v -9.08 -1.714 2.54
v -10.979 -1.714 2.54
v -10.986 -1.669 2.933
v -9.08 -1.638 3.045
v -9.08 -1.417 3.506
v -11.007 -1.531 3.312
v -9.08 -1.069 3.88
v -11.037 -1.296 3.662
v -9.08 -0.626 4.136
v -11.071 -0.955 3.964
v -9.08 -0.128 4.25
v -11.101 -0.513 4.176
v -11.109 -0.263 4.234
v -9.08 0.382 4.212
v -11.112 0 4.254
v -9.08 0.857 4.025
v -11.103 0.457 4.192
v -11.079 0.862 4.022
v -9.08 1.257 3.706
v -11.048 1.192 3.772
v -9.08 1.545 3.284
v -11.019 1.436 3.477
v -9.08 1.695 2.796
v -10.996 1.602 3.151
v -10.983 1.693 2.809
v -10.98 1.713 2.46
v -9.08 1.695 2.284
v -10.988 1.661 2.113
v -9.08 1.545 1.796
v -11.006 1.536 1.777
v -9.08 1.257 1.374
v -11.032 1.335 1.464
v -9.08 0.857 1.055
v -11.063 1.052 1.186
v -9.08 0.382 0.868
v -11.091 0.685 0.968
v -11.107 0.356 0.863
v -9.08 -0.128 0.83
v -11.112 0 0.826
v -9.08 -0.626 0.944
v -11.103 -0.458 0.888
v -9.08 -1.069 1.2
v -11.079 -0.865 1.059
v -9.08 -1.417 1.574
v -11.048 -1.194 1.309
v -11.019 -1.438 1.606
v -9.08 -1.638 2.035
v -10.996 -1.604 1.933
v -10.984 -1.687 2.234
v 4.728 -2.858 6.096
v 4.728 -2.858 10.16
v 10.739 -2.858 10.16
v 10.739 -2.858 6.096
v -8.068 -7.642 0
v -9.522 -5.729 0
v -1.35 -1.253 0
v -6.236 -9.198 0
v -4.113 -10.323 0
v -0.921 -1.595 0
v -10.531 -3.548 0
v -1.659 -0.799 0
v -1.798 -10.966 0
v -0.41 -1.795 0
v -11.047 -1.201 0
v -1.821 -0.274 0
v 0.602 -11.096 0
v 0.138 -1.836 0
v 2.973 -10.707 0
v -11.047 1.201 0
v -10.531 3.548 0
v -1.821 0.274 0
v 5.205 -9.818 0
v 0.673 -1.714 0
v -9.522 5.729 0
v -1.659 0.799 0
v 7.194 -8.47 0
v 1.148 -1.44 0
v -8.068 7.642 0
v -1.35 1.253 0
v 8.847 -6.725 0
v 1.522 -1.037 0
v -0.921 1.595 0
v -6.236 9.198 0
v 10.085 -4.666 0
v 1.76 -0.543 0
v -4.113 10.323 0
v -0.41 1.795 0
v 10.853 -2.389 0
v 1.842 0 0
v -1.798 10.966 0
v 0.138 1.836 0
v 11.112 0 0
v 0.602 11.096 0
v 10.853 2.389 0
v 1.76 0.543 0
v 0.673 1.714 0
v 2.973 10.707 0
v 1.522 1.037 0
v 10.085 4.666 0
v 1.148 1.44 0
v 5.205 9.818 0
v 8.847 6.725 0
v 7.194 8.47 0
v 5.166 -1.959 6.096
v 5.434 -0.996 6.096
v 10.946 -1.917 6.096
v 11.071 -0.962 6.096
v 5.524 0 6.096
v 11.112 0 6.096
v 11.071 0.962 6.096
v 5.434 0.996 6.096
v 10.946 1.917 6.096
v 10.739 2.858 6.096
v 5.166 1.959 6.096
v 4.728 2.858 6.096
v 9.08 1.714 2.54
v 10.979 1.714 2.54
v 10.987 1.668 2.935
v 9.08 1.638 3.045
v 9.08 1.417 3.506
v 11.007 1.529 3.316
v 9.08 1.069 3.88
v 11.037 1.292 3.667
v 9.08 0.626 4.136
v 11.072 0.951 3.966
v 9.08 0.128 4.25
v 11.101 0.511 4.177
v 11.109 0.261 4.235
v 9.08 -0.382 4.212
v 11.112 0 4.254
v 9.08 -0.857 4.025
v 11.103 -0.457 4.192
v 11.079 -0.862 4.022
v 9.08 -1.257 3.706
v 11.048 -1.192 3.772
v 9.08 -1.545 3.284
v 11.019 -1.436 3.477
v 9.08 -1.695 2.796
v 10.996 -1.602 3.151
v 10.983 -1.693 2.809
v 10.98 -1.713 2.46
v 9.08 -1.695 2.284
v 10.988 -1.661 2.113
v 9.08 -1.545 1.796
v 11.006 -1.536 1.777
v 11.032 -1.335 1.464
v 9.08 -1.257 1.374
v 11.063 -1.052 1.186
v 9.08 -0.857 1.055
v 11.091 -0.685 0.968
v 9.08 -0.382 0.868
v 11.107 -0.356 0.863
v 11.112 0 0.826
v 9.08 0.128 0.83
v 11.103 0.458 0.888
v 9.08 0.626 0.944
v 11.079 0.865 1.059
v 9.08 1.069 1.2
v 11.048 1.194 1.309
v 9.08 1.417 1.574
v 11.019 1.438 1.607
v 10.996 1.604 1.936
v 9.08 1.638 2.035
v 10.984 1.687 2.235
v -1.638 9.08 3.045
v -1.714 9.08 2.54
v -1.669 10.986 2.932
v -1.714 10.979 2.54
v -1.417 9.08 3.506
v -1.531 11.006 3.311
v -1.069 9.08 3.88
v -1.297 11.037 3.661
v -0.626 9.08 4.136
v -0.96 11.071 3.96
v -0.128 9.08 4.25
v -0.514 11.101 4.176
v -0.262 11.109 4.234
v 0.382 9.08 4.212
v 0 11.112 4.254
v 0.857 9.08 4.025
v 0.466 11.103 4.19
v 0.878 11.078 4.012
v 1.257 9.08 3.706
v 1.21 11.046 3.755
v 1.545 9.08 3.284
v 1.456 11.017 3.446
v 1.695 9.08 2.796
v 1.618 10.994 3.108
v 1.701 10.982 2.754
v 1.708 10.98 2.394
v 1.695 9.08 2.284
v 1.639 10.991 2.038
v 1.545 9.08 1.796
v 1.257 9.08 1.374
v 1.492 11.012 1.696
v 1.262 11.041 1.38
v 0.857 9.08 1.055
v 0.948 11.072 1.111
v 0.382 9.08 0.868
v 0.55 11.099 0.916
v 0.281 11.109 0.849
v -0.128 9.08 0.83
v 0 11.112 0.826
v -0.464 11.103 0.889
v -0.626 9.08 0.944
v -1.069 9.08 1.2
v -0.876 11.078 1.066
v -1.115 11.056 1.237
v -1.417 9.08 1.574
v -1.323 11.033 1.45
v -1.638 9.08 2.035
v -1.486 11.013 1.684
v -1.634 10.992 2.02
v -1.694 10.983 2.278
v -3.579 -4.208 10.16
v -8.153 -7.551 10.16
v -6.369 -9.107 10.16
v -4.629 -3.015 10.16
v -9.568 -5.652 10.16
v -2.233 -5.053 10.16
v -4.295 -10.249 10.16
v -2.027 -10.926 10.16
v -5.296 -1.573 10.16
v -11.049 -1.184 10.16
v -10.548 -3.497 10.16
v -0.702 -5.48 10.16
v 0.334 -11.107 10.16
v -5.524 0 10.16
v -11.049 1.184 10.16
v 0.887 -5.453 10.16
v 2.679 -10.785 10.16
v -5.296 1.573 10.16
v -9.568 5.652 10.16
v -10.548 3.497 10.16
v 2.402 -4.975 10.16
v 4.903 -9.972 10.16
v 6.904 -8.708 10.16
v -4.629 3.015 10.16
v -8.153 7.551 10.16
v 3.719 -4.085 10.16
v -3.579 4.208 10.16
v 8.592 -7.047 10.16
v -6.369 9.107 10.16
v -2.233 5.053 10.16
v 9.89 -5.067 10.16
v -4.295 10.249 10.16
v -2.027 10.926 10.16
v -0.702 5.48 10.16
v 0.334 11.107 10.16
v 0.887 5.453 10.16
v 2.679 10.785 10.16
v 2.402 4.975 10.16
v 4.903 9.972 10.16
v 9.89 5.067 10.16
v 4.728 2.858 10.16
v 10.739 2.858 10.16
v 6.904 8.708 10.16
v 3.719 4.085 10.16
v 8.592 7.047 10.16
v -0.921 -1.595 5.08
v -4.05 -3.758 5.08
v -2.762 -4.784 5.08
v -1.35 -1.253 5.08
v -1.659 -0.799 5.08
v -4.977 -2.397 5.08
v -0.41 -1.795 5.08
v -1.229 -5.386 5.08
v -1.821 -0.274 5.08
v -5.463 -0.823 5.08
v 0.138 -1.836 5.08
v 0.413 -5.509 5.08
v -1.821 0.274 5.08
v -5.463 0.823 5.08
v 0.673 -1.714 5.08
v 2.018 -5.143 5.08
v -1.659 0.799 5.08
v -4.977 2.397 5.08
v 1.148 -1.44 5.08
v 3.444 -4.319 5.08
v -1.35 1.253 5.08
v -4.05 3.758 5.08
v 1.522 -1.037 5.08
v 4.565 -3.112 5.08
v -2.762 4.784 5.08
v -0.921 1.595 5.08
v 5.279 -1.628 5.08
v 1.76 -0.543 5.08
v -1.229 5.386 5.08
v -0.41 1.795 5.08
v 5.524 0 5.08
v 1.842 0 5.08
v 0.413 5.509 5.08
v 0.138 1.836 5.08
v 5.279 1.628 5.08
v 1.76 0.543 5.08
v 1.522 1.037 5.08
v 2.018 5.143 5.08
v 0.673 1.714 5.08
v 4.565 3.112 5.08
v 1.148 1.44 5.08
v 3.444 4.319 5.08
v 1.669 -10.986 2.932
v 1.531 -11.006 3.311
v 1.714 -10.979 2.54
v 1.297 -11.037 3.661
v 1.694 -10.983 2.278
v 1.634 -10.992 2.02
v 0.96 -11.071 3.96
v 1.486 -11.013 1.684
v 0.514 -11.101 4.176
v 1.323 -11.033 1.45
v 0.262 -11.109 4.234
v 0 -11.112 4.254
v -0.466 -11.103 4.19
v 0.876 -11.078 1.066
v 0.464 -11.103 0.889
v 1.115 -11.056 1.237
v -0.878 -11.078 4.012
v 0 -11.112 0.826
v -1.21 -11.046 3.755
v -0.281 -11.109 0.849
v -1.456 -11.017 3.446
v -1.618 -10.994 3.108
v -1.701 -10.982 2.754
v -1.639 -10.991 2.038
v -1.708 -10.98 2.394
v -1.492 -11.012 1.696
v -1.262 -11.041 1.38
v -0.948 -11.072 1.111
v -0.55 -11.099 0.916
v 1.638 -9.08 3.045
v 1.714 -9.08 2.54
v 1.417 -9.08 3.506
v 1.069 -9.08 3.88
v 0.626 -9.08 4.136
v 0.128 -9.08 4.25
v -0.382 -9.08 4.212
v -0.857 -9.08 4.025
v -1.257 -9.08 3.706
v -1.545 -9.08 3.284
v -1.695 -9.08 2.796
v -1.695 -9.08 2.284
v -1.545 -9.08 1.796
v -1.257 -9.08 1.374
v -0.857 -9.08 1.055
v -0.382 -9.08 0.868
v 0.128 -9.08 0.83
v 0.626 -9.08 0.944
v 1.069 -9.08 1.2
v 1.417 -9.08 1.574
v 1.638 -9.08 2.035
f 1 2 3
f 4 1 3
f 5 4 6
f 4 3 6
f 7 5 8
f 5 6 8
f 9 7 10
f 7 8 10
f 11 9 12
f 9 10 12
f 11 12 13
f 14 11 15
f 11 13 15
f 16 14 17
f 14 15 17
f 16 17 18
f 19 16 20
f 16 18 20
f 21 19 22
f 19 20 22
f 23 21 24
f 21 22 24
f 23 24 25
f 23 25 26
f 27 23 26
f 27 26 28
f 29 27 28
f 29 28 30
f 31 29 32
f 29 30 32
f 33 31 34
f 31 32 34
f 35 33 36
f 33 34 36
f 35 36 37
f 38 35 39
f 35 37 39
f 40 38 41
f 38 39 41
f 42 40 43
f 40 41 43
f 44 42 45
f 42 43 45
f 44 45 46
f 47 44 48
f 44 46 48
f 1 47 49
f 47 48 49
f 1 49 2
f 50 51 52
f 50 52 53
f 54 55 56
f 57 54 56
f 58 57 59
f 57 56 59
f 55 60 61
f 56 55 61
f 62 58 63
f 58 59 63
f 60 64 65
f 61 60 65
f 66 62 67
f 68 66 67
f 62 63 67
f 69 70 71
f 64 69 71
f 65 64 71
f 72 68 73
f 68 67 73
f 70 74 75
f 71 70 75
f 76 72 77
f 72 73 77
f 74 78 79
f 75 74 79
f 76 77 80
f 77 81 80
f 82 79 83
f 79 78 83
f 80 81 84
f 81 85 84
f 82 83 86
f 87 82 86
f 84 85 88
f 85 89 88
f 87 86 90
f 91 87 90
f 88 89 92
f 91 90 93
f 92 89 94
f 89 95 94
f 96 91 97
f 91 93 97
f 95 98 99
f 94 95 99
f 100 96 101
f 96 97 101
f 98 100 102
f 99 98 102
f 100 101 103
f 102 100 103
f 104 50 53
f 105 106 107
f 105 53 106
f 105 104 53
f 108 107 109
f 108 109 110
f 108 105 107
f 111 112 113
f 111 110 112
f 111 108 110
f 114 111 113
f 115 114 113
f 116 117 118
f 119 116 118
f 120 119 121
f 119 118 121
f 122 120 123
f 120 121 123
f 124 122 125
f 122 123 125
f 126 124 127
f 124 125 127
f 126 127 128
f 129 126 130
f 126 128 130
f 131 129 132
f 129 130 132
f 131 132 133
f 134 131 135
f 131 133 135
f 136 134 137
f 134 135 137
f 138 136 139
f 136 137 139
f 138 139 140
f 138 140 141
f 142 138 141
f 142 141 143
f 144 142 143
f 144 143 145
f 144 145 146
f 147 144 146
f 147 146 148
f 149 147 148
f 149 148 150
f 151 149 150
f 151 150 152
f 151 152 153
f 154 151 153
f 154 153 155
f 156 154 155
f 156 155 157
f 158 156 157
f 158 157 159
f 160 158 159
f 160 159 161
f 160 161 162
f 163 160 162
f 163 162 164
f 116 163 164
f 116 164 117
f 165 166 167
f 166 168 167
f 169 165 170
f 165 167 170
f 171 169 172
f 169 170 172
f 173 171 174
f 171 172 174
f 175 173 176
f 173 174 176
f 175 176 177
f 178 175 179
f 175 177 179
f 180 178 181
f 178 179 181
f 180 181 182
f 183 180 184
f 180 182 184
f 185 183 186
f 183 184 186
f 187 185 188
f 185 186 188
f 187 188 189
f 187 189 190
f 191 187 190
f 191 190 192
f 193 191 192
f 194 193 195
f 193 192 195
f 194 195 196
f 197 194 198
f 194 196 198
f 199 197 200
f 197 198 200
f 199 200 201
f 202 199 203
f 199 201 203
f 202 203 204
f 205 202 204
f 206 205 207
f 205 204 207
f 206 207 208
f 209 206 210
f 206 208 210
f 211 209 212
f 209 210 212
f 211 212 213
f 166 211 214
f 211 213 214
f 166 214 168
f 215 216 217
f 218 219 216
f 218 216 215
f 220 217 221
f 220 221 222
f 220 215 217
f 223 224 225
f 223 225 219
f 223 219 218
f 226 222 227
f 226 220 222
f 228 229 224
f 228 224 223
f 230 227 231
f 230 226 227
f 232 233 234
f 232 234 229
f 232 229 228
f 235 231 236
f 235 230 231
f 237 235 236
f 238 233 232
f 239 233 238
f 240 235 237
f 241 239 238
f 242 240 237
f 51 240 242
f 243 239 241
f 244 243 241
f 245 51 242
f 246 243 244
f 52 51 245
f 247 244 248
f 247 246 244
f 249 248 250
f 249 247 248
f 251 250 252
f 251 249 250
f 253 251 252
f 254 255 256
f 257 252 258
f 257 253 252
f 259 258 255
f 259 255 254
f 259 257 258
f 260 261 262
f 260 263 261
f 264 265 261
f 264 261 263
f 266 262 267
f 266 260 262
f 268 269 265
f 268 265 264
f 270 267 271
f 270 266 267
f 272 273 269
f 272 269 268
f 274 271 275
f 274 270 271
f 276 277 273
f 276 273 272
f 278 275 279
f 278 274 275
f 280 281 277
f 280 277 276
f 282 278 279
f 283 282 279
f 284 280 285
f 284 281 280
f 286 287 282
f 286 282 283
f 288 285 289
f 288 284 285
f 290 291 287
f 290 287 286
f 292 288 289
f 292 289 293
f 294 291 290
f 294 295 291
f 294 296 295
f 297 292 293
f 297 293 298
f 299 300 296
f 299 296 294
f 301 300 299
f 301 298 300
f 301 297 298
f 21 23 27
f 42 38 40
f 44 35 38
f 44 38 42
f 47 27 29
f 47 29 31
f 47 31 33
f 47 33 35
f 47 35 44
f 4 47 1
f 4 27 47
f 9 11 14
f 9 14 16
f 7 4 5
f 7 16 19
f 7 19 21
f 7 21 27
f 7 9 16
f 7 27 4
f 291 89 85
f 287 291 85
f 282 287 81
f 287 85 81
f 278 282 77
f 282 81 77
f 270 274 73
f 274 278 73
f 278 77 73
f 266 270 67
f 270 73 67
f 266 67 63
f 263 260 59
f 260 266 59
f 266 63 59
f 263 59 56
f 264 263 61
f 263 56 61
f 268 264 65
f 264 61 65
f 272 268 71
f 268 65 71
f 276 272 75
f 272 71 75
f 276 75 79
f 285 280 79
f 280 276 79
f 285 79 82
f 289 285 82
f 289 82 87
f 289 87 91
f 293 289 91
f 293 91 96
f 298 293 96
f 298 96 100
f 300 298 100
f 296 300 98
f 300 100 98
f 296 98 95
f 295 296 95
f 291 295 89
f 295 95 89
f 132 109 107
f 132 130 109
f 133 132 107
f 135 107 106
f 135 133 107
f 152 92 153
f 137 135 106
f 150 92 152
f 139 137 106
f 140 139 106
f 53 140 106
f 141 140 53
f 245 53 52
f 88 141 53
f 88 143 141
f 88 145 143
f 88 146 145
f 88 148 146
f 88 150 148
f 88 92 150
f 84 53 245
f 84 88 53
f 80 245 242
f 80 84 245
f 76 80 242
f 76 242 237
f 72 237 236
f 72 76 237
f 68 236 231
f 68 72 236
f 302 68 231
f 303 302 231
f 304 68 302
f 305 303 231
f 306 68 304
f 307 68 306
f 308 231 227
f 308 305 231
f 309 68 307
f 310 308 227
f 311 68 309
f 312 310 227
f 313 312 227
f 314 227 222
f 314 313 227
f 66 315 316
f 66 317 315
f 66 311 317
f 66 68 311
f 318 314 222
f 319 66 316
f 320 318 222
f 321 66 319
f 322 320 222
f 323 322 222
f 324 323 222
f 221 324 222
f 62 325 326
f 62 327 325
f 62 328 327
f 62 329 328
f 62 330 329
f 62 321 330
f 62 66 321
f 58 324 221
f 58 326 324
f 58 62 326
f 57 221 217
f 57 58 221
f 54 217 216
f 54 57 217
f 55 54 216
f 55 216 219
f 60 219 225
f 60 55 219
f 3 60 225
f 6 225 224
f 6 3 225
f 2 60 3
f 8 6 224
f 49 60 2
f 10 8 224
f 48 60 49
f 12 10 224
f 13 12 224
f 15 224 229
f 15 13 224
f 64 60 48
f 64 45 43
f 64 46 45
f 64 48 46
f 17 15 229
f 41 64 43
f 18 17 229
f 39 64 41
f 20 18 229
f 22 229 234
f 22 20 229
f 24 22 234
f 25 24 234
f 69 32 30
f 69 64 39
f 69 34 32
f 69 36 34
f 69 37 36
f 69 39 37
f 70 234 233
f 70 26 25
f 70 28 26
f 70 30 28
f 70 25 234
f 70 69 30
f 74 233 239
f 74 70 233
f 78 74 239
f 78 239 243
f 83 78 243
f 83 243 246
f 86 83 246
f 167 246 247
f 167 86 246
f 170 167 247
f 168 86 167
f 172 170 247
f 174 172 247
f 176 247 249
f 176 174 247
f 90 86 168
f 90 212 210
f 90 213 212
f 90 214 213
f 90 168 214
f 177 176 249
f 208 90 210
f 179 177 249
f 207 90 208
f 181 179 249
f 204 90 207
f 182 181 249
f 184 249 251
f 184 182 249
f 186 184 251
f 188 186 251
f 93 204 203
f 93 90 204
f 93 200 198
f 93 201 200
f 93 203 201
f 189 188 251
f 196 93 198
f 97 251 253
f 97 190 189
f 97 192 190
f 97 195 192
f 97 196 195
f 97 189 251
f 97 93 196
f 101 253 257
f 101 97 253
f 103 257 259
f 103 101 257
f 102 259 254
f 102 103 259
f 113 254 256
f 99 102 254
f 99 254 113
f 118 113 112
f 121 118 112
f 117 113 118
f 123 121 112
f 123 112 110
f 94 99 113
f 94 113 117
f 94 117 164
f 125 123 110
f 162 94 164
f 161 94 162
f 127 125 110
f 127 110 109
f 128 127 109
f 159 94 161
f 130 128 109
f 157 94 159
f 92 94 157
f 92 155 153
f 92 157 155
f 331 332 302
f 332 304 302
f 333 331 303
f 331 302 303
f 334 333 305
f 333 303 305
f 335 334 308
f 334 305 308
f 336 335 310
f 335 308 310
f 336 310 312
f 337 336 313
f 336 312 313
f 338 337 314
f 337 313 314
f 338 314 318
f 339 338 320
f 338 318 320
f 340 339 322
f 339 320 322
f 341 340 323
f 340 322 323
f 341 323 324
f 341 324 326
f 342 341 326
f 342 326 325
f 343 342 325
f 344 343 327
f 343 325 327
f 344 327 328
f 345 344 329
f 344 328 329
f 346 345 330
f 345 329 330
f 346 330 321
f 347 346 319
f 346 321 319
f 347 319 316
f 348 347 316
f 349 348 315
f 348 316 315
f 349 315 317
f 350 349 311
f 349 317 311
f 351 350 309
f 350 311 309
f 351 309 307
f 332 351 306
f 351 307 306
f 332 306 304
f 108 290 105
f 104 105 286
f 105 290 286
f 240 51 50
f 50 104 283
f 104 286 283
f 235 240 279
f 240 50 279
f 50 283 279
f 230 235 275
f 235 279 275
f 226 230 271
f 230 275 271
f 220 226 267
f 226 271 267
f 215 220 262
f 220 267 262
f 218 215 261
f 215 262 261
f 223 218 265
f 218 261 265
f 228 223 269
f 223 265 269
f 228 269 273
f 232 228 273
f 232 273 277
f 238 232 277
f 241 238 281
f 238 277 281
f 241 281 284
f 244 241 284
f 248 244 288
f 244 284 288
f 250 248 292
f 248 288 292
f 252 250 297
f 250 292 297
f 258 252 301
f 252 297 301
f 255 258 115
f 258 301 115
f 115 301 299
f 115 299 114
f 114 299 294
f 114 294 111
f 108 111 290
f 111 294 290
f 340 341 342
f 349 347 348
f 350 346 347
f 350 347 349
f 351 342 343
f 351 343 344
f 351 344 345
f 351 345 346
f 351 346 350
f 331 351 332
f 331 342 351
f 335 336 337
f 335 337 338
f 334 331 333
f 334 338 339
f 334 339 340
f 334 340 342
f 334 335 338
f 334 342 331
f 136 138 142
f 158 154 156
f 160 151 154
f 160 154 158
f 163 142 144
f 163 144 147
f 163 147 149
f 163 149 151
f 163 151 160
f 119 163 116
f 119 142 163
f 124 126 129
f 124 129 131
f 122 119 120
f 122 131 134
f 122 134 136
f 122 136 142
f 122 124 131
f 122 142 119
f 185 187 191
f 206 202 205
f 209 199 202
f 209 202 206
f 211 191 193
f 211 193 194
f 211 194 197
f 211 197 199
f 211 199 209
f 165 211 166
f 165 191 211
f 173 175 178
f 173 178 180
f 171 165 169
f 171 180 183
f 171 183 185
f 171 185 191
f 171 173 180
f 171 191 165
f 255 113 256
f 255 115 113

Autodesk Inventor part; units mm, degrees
ref_plane "YZ Plane" through (0, 0, 0) normal (1, 0, 0) x (0, 1, 0)
ref_plane "XY Plane" through (0, 0, 0) normal (0, 0, 1) x (1, 0, 0)
sketch "Sketch1" plane through (0, 0, 0) normal (0, 0, 1) x (1, 0, 0)
  circle A0 centre (0, 0) radius 11.1125
  circle A1 centre (0, 0) radius 5.5245
  circle A2 centre (0, 0) radius 1.8415
  dimension "d0" = 22.225
  dimension "d1" = 11.049
  dimension "d2" = 3.683
extrude "Extrusion1" add sketch "Sketch1" along normal blind 10.16 contours A0
extrude "Extrusion2" add sketch "Sketch1" along normal blind 5.08 contours A1
sketch "Sketch2" plane through (0, 0, 0) normal (1, 0, 0) x (0, 1, 0)
  line L0 (11.1125, 10.16) -> (-11.1125, 10.16) projected
  line L1 (2.8575, 10.16) -> (-2.8575, 10.16)
  line L2 (-2.8575, 10.16) -> (-2.8575, 6.096)
  line L3 (-2.8575, 6.096) -> (2.8575, 6.096)
  line L4 (2.8575, 6.096) -> (2.8575, 10.16)
  point P0 (0, 0)
  dimension "d7" = 5.715
  dimension "d8" = 2.8575
  dimension "d9" = 4.064
extrude "Extrusion3" cut sketch "Sketch2" along normal through all
ref_plane "Work Plane1" through (0, 11.1125, 0) normal (0, 1, 0) x (-1, 0, 0)
sketch "Sketch3" plane through (0, 11.1125, 0) normal (0, 1, 0) x (-1, 0, 0)
  line L0 (11.1125, 0) -> (11.1125, 10.16) construction
  circle A0 centre (0, 2.54) radius 1.7145
  point P0 (0, 0)
  dimension "d12" = 3.429
  dimension "d13" = 2.54
extrude "Extrusion4" cut sketch "Sketch3" against normal blind 2.032
pattern_circular "Circular Pattern1" count 4 over 360 about axis through (0, 0, 0) along (0, 0, 1) of "Extrusion4"
equation "\"d5\" = 0.5 * d3"
equation "\"d8\" = 0.5 * d7"
equation "\"d10\" = 0.5 * d3"
equation "\"d3\" = 10.16"
properties part number "EncoderDisc" material "ABS Plastic"
